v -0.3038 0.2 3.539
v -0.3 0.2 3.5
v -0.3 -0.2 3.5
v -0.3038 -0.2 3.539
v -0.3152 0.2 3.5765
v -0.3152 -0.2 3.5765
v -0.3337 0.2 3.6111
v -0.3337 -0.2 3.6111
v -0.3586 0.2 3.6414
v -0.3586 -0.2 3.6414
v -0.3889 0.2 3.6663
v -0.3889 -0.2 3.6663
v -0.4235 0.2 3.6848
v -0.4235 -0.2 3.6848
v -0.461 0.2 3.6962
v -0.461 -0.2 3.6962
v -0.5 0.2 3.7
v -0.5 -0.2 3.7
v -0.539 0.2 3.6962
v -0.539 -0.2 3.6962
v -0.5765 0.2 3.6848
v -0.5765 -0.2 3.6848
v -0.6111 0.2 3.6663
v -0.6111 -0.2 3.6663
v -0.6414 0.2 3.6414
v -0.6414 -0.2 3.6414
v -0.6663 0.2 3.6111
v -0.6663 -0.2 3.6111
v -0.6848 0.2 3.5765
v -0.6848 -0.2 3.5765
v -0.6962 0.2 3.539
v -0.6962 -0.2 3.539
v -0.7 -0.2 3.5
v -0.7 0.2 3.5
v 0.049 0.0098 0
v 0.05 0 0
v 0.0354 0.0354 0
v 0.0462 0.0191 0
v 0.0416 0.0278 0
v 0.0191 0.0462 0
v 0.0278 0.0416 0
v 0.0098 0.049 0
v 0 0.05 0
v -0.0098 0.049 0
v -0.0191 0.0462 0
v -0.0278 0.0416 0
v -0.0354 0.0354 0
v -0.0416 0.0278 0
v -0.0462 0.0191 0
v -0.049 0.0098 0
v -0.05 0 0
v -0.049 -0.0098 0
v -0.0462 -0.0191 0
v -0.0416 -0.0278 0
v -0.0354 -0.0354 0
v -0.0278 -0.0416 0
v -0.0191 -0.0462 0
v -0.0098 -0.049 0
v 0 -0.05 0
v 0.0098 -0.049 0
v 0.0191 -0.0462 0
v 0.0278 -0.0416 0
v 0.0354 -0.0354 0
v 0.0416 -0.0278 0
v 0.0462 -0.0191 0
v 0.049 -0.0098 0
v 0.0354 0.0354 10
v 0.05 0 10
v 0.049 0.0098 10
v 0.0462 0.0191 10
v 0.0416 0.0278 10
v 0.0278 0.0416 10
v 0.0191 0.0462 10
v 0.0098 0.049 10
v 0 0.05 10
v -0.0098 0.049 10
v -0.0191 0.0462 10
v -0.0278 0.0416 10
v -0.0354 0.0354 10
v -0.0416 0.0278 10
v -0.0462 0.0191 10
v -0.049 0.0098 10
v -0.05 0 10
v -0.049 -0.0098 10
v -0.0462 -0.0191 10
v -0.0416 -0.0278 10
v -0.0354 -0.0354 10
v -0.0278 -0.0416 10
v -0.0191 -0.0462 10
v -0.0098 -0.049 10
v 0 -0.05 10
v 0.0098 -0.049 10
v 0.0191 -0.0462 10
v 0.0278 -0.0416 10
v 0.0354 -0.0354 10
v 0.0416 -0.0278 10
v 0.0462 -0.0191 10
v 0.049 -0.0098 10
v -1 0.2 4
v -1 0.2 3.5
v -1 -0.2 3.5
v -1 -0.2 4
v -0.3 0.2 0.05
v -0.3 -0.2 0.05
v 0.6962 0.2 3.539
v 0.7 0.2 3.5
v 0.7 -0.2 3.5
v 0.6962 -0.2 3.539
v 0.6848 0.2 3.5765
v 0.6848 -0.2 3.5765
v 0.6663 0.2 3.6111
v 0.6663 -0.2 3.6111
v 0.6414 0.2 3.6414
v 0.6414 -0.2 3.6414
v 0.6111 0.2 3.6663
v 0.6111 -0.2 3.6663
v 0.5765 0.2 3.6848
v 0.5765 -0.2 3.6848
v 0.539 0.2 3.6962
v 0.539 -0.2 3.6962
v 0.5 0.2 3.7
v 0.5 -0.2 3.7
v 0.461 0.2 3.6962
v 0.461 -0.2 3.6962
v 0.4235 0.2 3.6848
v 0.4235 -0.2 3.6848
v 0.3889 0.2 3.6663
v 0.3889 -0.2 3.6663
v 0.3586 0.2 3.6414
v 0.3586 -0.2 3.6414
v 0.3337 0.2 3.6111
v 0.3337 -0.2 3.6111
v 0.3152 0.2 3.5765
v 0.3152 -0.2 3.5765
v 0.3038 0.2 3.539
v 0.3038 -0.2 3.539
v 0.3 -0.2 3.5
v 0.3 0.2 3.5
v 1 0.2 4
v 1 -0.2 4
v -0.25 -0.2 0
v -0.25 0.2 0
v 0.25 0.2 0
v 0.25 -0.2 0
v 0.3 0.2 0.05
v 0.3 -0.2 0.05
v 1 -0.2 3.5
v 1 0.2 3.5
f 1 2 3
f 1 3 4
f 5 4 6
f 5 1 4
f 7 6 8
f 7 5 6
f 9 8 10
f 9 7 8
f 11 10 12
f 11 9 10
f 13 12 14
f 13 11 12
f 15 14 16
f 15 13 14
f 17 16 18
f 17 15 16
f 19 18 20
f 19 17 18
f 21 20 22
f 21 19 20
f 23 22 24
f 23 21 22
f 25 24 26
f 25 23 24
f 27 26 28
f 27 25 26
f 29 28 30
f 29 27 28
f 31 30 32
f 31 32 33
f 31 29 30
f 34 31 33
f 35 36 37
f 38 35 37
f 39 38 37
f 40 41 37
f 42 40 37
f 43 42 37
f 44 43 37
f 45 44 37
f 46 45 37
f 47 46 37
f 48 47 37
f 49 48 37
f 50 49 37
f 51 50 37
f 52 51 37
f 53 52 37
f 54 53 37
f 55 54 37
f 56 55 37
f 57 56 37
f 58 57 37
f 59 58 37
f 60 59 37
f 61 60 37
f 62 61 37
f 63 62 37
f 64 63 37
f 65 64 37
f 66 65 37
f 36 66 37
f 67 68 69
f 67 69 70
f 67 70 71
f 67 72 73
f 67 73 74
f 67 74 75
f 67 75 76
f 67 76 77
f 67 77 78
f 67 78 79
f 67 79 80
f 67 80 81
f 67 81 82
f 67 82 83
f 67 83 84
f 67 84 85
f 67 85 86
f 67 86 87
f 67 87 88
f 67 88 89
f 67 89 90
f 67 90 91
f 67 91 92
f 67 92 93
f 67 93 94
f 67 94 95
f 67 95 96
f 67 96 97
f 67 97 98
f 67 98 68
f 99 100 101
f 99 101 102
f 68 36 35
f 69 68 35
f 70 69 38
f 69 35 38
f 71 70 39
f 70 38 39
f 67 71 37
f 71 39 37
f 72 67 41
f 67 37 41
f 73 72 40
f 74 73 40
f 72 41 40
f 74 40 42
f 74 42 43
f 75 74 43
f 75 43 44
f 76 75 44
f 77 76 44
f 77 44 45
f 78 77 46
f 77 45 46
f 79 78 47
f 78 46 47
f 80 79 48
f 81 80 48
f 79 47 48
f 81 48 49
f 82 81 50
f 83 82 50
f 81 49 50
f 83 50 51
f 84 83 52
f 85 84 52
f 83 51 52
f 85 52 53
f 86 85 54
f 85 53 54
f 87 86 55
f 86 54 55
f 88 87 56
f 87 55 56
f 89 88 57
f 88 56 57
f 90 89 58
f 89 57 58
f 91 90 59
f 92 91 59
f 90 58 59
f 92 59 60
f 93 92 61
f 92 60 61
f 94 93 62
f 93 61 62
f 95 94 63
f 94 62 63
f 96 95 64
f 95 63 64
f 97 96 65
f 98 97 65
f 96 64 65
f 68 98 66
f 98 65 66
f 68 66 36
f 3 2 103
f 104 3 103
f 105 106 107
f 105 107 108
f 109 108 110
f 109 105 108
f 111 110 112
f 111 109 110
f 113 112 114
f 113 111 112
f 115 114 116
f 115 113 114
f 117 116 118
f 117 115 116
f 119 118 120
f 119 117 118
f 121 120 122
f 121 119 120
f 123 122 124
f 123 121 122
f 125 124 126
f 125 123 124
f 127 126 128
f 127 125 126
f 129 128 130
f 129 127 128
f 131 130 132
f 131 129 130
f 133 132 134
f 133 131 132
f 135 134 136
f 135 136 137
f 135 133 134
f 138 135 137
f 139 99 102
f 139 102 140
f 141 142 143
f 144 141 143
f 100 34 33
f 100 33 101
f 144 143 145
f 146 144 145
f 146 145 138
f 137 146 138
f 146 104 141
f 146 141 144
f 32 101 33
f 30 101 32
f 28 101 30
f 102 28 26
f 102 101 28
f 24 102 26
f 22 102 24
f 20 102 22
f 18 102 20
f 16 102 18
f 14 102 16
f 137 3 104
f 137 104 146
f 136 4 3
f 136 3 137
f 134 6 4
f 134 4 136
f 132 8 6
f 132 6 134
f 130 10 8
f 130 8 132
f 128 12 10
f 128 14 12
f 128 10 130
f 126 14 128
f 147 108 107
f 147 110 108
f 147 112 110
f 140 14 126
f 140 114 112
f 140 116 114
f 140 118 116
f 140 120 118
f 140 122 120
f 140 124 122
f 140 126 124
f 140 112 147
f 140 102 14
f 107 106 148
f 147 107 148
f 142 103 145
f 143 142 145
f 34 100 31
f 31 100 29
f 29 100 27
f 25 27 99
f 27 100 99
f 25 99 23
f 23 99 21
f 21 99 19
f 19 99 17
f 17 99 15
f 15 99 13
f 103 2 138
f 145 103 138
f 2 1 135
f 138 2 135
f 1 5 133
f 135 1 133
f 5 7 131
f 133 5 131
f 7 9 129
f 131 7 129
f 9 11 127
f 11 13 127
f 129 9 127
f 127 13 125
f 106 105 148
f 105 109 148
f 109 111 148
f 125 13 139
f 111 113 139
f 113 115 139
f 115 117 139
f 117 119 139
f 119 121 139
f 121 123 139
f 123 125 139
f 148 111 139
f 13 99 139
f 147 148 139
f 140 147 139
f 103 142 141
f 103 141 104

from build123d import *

# Parameters (mm, degrees)
CYLINDER_R     = 0.05
CYLINDER_DEPTH = 10
EXTRUDE_DEPTH  = 0.4


with BuildPart() as cylinder:
    # Cylinder → Cylinder (new body)
    with BuildSketch(Plane.XY):
        Circle(CYLINDER_R)
    extrude(amount=CYLINDER_DEPTH)


with BuildPart() as pinextrude001:
    # Sketch → Extrude (new body)
    with BuildSketch(Plane.XZ.offset(-0.2)):
        with BuildLine():
            Line((0, 0), (0.25, 0))
            Line((0.25, 0), (0.3, 0.05))
            Line((0.3, 0.05), (0.3, 3.5))
            ThreePointArc((0.7, 3.5), (0.5, 3.7), (0.3, 3.5))
            Line((0.7, 3.5), (1, 3.5))
            Line((1, 3.5), (1, 4))
            Line((0, 4), (1, 4))
            Line((-1, 4), (0, 4))
            Line((-1, 3.5), (-1, 4))
            Line((-0.7, 3.5), (-1, 3.5))
            ThreePointArc((-0.3, 3.5), (-0.5, 3.7), (-0.7, 3.5))
            Line((-0.3, 3.5), (-0.3, 0.05))
            Line((-0.25, 0), (-0.3, 0.05))
            Line((0, 0), (-0.25, 0))
        make_face()
    extrude(amount=EXTRUDE_DEPTH)


solid = Compound([cylinder.part, pinextrude001.part])
